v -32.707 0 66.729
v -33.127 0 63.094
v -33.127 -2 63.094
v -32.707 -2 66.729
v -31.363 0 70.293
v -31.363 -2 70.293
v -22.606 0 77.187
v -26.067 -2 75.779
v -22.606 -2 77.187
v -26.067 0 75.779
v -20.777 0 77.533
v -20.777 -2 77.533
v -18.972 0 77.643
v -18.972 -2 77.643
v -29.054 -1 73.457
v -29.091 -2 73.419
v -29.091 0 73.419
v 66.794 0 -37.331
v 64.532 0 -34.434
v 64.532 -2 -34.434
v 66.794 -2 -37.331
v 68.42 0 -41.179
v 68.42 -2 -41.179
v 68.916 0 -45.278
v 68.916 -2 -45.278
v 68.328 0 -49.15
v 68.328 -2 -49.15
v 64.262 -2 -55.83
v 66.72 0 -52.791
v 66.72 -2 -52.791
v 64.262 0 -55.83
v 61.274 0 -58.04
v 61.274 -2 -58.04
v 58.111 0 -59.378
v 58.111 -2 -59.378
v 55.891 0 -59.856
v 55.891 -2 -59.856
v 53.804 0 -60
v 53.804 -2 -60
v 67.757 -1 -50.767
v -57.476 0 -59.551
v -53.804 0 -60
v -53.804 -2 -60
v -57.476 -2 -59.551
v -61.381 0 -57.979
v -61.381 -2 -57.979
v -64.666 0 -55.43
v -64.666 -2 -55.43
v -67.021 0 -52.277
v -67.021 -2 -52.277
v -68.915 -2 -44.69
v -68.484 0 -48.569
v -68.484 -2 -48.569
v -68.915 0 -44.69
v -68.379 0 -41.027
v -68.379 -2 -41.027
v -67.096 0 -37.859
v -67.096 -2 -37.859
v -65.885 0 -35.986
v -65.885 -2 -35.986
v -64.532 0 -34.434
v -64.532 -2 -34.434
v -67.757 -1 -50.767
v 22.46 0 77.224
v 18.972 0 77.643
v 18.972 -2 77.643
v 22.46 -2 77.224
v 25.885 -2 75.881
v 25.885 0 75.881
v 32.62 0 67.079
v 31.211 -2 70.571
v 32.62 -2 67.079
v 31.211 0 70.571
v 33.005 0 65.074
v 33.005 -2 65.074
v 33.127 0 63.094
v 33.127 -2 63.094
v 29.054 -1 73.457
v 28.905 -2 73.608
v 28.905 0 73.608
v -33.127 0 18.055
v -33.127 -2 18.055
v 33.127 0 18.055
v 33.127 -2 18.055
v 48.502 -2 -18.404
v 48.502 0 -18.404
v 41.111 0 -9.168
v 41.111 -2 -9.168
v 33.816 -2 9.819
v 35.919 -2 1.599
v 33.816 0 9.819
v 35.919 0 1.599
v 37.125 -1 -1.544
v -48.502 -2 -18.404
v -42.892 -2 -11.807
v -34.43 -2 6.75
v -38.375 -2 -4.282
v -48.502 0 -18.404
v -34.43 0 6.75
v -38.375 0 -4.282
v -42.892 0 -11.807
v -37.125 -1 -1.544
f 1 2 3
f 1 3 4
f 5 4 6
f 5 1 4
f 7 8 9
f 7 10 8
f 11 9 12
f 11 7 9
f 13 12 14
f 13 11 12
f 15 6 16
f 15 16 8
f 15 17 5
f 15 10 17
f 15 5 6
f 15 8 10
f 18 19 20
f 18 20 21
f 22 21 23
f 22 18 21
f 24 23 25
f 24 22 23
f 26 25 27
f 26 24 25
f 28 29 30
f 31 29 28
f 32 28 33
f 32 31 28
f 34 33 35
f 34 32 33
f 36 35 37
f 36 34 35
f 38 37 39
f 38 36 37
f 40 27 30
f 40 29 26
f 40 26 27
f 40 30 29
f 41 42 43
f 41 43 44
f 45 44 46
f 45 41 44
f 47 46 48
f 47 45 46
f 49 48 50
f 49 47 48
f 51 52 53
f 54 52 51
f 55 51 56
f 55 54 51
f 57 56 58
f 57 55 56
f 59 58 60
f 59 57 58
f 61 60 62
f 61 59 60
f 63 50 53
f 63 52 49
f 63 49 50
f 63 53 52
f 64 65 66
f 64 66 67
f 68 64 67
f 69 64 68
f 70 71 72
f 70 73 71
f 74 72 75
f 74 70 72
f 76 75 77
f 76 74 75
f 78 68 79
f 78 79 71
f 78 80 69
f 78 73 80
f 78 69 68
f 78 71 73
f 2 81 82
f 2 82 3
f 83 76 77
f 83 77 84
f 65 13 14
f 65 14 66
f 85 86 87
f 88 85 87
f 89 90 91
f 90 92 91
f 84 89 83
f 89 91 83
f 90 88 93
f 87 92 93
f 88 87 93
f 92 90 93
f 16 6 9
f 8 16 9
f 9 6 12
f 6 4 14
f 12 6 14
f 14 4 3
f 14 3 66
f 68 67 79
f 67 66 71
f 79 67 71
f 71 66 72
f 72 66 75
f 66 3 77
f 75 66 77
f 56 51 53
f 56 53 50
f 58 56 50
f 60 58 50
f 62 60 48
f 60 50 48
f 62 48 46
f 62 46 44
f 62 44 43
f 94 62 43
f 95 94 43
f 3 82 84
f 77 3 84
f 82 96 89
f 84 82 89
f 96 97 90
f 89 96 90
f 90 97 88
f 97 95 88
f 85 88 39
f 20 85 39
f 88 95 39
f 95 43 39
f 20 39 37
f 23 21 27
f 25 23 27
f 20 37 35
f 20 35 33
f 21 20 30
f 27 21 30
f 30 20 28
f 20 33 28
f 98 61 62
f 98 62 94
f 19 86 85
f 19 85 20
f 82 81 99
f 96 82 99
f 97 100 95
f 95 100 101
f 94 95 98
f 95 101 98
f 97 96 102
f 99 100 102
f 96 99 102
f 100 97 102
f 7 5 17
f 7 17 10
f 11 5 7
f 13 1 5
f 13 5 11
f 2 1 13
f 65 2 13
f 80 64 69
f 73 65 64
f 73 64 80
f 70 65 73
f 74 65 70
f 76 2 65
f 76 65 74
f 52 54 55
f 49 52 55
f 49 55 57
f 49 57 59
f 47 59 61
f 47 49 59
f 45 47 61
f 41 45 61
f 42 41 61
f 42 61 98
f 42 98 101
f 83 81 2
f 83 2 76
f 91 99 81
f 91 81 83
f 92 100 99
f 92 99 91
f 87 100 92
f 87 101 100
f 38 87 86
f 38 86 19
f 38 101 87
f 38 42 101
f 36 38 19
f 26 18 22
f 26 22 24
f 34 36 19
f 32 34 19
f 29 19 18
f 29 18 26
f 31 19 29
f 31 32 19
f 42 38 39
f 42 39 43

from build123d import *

# Parameters (mm, degrees)
BOSS_EXTRUDE1_DEPTH = 2


with BuildPart() as part:
    # Sketch2 → Boss-Extrude1 (new body)
    with BuildSketch(Plane(origin=(0, 0, 0), x_dir=(1, 0, 0), z_dir=(0, 1, 0))):
        with BuildLine():
            Line((33.126933041, -63.09374476), (33.126933041, -18.054684141))
            add(Edge.make_bspline(
                [(48.502275197, 18.403994452), (33.126933041, 3.028652296), (33.126933041, -18.054684141)],
                knots=[1.874843142, 1.874843142, 1.874843142, 2.666072932, 2.666072932, 2.666072932], degree=2, weights=[1, 0.922759773, 1]))
            Line((48.502275197, 18.403994452), (64.532040349, 34.433759604))
            add(Edge.make_bspline(
                [(64.532040349, 34.433759604), (90.098280745, 60), (53.804046318, 60)],
                knots=[2.359992588, 2.359992588, 2.359992588, 4.71238898, 4.71238898, 4.71238898], degree=2, weights=[1, 0.384437234, 1]))
            Line((53.804046318, 60), (-53.804046318, 60))
            add(Edge.make_bspline(
                [(-53.804046318, 60), (-90.098280745, 60), (-64.532040349, 34.433759604)],
                knots=[1.570796327, 1.570796327, 1.570796327, 3.923192719, 3.923192719, 3.923192719], degree=2, weights=[1, 0.384437234, 1]))
            Line((-64.532040349, 34.433759604), (-48.502275197, 18.403994452))
            add(Edge.make_bspline(
                [(-33.126933041, -18.054684141), (-33.126933041, 3.028652296), (-48.502275197, 18.403994452)],
                knots=[3.617112375, 3.617112375, 3.617112375, 4.408342165, 4.408342165, 4.408342165], degree=2, weights=[1, 0.922759773, 1]))
            Line((-33.126933041, -18.054684141), (-33.126933041, -63.09374476))
            add(Edge.make_bspline(
                [(-33.126933041, -63.09374476), (-33.126933041, -77.64337492), (-18.972450653, -77.64337492)],
                knots=[2.250325805, 2.250325805, 2.250325805, 3.732484786, 3.732484786, 3.732484786], degree=2, weights=[1, 0.737740241, 1]))
            Line((-18.972450653, -77.64337492), (18.972450653, -77.64337492))
            add(Edge.make_bspline(
                [(18.972450653, -77.64337492), (33.126933041, -77.64337492), (33.126933041, -63.09374476)],
                knots=[5.692293175, 5.692293175, 5.692293175, 7.174452156, 7.174452156, 7.174452156], degree=2, weights=[1, 0.737740241, 1]))
        make_face()
    extrude(amount=-BOSS_EXTRUDE1_DEPTH)


solid = part.part
